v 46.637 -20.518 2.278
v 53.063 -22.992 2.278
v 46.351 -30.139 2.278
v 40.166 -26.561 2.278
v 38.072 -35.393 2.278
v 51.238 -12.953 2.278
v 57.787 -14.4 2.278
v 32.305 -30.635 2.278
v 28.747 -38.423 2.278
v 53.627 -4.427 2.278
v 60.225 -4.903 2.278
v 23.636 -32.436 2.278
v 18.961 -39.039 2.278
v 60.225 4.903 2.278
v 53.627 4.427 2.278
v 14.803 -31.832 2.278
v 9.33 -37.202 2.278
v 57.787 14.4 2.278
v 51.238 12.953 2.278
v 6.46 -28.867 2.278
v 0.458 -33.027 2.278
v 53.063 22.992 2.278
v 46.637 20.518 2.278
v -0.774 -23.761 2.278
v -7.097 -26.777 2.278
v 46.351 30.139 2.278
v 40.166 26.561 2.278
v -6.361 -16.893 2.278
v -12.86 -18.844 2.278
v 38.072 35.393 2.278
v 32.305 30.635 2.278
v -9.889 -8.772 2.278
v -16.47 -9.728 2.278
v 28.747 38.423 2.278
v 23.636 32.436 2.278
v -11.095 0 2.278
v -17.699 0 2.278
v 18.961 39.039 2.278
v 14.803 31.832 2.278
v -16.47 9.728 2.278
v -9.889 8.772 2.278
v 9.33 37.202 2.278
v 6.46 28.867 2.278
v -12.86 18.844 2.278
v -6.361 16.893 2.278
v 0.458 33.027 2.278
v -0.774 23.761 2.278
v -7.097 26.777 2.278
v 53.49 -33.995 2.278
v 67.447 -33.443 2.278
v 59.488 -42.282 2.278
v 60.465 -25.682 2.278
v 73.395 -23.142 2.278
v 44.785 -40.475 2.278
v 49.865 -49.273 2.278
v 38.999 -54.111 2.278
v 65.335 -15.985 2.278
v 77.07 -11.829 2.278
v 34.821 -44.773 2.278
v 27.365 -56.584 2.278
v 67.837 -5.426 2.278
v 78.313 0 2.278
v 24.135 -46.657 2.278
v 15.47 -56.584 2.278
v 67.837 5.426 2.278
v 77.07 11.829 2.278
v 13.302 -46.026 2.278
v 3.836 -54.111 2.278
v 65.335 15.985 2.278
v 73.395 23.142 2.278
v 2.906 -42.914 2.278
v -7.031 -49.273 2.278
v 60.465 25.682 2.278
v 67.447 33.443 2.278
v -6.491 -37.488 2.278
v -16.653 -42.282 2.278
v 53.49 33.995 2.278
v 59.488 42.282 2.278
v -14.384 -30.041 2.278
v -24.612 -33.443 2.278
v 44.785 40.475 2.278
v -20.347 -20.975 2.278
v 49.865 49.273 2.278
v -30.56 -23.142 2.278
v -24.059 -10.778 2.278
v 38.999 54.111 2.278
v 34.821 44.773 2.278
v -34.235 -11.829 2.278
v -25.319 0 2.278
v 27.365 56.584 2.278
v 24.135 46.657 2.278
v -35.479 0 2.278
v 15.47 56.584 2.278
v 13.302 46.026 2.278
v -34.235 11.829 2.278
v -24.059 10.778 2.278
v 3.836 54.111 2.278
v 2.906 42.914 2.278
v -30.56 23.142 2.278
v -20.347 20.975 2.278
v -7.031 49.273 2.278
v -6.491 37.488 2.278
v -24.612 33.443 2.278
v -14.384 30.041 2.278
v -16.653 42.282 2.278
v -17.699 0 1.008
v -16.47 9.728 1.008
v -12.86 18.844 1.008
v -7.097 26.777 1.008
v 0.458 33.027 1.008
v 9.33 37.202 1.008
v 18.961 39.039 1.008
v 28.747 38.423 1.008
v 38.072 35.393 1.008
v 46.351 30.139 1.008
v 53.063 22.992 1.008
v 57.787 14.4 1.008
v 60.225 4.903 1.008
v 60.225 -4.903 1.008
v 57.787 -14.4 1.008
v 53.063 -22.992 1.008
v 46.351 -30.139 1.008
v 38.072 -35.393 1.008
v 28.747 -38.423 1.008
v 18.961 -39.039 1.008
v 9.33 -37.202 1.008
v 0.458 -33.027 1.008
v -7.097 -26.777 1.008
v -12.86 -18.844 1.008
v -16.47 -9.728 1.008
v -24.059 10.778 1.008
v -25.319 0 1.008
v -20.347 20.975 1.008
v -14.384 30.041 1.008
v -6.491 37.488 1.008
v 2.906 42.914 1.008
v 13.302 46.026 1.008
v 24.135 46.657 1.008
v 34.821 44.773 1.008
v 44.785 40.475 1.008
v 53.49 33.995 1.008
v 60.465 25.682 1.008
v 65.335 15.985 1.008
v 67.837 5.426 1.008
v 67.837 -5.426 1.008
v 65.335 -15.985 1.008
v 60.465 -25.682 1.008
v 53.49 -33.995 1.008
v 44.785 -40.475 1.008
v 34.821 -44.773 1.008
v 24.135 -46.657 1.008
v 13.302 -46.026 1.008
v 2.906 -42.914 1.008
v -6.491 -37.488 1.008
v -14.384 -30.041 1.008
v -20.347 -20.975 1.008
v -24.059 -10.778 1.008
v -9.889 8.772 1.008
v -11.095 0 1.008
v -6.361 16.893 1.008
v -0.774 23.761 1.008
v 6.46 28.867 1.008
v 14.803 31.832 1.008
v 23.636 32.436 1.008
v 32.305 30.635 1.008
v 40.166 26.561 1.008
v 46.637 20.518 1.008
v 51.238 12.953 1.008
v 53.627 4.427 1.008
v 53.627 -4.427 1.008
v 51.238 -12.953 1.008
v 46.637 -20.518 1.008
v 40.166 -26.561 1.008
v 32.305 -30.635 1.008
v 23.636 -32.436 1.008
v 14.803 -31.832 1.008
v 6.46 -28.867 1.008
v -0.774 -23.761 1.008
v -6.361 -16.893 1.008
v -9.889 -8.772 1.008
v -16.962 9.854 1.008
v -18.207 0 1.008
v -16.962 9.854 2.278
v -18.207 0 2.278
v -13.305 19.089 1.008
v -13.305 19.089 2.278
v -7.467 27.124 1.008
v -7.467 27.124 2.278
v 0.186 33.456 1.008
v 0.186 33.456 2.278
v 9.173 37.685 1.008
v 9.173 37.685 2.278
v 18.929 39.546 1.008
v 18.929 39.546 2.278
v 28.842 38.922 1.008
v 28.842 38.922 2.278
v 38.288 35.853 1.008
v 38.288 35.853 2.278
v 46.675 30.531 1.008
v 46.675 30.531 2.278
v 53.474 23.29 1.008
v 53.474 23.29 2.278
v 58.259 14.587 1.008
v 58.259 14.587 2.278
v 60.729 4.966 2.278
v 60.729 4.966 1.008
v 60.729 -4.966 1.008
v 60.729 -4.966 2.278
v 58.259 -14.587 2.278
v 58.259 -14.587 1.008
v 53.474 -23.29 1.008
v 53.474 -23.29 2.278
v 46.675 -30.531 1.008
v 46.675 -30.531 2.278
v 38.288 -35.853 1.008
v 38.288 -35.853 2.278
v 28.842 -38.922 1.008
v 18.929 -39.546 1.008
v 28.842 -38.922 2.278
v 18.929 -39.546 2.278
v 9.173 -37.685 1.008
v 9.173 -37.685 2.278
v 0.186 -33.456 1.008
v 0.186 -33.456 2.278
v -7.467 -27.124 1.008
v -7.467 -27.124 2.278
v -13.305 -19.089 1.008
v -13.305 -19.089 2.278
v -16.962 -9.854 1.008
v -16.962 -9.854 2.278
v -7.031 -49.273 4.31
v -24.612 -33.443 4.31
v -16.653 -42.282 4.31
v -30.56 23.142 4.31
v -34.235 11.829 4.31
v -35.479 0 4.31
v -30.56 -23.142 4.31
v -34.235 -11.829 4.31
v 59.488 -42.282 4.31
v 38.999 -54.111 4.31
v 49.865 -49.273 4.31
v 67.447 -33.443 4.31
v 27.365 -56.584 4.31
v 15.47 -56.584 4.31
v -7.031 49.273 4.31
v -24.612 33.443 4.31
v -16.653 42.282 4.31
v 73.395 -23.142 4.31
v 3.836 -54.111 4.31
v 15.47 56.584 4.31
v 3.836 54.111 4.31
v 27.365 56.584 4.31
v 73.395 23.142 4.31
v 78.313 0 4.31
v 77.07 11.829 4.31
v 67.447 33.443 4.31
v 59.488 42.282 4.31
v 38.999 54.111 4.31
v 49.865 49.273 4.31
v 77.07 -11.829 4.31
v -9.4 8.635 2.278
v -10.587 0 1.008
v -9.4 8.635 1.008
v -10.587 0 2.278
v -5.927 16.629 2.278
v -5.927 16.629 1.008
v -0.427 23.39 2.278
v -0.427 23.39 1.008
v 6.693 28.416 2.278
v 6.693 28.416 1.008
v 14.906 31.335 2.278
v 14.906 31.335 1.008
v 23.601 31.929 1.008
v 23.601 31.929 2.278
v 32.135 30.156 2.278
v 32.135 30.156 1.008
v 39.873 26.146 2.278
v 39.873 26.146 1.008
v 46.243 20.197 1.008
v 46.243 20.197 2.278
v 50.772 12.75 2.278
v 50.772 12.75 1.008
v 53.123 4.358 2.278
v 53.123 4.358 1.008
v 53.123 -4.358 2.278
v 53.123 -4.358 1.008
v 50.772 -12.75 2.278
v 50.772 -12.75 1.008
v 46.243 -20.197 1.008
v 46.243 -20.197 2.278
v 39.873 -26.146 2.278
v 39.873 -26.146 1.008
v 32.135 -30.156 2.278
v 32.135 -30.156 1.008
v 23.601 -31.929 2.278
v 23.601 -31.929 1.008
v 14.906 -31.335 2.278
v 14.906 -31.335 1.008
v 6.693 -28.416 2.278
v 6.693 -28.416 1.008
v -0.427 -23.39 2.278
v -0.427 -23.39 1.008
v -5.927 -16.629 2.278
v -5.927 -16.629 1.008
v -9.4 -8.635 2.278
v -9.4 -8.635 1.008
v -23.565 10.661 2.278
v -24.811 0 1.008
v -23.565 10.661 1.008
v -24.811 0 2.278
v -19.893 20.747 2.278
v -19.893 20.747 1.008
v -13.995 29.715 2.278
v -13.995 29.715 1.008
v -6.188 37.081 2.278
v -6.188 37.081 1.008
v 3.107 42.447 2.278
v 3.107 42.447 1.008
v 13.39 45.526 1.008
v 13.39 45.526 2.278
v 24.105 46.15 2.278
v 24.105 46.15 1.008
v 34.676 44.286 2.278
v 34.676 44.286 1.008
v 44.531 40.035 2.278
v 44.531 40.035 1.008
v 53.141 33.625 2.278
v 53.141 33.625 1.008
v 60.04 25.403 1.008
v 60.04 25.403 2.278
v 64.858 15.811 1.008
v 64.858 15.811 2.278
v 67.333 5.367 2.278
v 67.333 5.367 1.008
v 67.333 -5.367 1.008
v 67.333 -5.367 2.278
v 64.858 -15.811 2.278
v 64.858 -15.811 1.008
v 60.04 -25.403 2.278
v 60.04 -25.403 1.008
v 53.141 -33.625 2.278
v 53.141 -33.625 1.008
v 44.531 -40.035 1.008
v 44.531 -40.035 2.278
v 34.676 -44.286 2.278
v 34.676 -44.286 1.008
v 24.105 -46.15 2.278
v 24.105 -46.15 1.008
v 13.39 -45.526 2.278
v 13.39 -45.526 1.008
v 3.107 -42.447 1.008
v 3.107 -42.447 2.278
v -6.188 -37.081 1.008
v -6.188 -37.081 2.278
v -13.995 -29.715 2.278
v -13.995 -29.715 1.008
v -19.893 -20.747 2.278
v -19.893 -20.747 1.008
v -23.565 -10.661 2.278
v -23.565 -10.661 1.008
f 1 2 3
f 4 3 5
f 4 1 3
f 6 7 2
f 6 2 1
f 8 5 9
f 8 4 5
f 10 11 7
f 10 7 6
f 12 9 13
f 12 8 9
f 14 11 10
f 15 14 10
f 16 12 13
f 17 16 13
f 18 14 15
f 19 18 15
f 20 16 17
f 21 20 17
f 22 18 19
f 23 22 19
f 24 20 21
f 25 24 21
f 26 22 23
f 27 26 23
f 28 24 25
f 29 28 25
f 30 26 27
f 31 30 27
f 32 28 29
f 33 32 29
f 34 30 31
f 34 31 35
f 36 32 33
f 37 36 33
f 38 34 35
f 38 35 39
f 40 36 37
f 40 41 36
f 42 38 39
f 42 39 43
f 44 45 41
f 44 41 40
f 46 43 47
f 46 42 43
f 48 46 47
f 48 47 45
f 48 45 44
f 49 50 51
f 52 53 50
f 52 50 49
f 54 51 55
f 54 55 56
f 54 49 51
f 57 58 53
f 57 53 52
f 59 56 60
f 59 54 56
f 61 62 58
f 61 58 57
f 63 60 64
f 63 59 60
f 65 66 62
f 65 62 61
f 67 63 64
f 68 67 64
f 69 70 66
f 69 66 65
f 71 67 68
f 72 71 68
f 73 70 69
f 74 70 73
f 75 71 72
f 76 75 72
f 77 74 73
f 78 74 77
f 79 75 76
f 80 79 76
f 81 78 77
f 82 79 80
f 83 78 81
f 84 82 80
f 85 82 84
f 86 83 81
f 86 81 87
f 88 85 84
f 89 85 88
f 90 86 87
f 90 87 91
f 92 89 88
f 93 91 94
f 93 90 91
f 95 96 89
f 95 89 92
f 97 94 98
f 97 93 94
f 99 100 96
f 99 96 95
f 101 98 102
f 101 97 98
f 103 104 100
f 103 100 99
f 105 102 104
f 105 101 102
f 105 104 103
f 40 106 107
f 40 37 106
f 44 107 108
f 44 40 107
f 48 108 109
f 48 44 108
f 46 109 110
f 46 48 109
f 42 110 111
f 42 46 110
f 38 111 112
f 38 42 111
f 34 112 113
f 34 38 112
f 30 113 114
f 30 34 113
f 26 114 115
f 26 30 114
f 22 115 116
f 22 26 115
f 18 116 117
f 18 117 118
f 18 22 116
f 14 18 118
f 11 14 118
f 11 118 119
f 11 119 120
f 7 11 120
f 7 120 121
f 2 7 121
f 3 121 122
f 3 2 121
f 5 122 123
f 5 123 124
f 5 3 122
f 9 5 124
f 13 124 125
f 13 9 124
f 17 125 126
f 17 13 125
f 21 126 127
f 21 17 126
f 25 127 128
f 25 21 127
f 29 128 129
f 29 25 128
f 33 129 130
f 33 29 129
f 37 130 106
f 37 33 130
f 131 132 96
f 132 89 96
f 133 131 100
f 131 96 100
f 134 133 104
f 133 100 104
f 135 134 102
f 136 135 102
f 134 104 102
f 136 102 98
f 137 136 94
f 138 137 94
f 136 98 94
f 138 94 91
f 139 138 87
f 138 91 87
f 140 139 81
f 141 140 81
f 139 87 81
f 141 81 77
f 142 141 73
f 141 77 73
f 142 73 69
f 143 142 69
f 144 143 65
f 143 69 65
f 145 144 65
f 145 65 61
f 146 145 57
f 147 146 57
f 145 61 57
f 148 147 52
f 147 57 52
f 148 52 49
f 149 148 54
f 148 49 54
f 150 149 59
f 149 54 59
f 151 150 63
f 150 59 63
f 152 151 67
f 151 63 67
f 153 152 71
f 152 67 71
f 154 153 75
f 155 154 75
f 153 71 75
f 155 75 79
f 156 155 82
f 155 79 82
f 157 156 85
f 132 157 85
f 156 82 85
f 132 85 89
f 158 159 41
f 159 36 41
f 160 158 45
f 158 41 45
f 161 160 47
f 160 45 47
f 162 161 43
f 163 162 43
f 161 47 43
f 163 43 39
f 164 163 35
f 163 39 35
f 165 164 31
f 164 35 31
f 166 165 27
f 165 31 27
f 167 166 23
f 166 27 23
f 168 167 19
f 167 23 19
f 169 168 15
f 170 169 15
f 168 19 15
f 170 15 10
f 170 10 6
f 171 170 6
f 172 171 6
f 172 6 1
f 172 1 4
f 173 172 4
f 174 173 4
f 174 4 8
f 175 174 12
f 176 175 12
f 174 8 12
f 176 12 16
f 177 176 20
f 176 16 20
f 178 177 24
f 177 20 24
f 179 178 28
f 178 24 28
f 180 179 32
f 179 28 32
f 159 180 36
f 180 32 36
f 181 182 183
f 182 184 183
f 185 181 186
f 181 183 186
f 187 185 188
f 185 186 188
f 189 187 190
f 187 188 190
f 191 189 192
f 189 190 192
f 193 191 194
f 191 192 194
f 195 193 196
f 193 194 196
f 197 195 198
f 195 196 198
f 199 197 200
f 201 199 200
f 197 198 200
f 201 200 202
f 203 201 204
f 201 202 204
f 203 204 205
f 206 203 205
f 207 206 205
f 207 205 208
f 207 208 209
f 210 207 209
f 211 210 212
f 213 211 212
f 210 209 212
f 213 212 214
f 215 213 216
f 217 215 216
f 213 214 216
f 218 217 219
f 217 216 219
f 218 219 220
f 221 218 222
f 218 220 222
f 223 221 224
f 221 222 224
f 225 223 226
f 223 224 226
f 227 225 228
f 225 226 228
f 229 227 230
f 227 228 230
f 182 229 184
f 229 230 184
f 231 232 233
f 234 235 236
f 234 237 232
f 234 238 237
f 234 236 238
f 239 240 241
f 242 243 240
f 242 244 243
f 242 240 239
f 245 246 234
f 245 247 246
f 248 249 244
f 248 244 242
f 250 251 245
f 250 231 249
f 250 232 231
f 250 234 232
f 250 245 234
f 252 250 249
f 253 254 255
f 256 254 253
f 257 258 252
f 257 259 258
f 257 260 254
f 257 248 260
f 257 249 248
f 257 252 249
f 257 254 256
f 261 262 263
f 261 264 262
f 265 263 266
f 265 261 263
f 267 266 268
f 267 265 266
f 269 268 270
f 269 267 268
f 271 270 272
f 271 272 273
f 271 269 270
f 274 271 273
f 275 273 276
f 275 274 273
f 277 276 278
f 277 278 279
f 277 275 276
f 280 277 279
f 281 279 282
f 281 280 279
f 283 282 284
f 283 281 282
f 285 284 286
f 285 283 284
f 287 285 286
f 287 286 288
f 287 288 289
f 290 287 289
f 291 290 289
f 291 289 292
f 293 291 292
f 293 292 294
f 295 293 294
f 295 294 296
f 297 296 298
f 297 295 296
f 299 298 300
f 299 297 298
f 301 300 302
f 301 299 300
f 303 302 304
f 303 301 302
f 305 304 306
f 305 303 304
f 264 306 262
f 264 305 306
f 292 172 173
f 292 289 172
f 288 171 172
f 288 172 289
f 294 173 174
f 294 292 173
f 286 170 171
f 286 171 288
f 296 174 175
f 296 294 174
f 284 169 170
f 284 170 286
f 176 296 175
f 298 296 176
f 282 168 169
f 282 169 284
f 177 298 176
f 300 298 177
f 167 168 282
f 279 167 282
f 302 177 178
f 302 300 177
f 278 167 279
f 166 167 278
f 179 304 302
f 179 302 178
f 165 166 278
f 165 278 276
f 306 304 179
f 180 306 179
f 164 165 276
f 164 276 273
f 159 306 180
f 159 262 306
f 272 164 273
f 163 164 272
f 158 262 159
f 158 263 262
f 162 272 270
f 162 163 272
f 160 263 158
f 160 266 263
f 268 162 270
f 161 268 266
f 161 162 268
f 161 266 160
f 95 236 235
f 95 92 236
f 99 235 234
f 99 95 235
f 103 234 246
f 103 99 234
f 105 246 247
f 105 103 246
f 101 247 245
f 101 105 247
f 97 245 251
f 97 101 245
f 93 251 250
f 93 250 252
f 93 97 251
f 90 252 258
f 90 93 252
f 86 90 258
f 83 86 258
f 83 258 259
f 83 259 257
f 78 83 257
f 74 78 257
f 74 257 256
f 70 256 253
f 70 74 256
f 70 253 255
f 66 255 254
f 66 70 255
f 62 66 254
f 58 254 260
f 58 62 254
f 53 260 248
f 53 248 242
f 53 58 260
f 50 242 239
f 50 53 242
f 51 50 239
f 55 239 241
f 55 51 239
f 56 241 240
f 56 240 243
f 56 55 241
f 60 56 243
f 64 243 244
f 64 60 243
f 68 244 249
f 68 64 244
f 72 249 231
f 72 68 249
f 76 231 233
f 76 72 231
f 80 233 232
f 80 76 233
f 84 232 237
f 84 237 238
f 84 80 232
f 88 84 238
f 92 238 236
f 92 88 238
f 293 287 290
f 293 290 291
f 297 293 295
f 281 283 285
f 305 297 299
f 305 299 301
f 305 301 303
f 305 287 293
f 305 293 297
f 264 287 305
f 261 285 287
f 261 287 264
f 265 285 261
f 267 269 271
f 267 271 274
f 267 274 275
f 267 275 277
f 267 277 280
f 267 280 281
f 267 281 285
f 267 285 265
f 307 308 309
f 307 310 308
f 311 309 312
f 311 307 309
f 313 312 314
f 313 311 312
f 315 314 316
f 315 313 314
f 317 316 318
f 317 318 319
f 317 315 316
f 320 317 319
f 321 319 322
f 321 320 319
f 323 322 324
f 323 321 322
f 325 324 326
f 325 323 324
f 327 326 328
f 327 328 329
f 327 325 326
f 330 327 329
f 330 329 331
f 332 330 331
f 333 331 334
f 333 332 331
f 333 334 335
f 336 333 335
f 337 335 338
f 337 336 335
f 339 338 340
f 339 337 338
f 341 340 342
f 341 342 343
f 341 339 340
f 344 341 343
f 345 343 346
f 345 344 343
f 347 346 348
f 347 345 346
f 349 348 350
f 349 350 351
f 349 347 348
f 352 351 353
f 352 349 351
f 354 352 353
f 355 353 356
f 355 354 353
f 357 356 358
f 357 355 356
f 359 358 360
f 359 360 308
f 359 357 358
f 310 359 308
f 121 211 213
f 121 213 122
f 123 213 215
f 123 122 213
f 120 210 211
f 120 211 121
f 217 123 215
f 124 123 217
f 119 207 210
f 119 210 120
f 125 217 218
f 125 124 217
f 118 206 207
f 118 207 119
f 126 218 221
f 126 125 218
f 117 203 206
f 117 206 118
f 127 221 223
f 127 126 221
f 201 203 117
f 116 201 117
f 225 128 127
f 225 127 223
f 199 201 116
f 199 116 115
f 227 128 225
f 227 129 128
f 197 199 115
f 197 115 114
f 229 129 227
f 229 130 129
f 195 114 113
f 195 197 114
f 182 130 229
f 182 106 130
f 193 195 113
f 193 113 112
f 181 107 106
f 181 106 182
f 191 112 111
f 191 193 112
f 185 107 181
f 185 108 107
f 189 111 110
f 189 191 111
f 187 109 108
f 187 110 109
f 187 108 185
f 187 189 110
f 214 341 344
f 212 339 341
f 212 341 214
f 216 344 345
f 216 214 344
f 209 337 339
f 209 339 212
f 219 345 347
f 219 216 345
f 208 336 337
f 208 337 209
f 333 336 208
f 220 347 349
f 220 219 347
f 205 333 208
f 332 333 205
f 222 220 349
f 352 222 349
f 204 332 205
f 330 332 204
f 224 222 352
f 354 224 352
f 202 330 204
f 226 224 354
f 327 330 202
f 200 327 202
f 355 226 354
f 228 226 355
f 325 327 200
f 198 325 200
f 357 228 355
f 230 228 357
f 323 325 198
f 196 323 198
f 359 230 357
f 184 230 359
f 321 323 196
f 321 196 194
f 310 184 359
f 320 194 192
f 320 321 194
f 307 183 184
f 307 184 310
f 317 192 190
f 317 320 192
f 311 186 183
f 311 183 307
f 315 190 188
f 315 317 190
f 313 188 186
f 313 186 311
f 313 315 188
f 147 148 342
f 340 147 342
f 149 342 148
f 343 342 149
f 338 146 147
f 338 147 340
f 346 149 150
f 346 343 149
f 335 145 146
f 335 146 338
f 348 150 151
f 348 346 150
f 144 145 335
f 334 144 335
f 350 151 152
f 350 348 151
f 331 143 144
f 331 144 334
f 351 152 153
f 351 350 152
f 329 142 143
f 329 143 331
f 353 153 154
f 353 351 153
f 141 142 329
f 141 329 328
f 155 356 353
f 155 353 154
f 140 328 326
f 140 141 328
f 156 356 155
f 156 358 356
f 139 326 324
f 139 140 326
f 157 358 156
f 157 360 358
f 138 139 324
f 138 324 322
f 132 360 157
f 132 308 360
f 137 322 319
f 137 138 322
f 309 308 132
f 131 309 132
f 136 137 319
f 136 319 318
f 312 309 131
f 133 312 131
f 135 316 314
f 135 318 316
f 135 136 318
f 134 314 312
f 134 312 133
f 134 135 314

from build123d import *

# Parameters (mm, degrees)
F0_W = 0.508
F0_H = 1.27


with BuildPart() as f1:
    # F0 (on Front) → F1 (revolve)
    with BuildSketch(Plane.XZ):
        Polygon((21.417418, 4.309946), (-35.478582, 4.309946), (-35.478582, 2.277946), (-25.318582, 2.277946), (-24.810582, 2.277946), (-18.206582, 2.277946), (-17.698582, 2.277946), (-11.094582, 2.277946), (-10.586582, 2.277946), (21.417418, 2.277946), align=None)
        with Locations((-25.064582, 1.642946)):
            Rectangle(F0_W, F0_H)
        with Locations((-10.840582, 1.642946)):
            Rectangle(F0_W, F0_H)
        with Locations((-17.952582, 1.642946)):
            Rectangle(F0_W, F0_H)
    revolve(axis=Axis((21.417418, 0, 3.293946), (0, 0, -1)))


solid = f1.part
